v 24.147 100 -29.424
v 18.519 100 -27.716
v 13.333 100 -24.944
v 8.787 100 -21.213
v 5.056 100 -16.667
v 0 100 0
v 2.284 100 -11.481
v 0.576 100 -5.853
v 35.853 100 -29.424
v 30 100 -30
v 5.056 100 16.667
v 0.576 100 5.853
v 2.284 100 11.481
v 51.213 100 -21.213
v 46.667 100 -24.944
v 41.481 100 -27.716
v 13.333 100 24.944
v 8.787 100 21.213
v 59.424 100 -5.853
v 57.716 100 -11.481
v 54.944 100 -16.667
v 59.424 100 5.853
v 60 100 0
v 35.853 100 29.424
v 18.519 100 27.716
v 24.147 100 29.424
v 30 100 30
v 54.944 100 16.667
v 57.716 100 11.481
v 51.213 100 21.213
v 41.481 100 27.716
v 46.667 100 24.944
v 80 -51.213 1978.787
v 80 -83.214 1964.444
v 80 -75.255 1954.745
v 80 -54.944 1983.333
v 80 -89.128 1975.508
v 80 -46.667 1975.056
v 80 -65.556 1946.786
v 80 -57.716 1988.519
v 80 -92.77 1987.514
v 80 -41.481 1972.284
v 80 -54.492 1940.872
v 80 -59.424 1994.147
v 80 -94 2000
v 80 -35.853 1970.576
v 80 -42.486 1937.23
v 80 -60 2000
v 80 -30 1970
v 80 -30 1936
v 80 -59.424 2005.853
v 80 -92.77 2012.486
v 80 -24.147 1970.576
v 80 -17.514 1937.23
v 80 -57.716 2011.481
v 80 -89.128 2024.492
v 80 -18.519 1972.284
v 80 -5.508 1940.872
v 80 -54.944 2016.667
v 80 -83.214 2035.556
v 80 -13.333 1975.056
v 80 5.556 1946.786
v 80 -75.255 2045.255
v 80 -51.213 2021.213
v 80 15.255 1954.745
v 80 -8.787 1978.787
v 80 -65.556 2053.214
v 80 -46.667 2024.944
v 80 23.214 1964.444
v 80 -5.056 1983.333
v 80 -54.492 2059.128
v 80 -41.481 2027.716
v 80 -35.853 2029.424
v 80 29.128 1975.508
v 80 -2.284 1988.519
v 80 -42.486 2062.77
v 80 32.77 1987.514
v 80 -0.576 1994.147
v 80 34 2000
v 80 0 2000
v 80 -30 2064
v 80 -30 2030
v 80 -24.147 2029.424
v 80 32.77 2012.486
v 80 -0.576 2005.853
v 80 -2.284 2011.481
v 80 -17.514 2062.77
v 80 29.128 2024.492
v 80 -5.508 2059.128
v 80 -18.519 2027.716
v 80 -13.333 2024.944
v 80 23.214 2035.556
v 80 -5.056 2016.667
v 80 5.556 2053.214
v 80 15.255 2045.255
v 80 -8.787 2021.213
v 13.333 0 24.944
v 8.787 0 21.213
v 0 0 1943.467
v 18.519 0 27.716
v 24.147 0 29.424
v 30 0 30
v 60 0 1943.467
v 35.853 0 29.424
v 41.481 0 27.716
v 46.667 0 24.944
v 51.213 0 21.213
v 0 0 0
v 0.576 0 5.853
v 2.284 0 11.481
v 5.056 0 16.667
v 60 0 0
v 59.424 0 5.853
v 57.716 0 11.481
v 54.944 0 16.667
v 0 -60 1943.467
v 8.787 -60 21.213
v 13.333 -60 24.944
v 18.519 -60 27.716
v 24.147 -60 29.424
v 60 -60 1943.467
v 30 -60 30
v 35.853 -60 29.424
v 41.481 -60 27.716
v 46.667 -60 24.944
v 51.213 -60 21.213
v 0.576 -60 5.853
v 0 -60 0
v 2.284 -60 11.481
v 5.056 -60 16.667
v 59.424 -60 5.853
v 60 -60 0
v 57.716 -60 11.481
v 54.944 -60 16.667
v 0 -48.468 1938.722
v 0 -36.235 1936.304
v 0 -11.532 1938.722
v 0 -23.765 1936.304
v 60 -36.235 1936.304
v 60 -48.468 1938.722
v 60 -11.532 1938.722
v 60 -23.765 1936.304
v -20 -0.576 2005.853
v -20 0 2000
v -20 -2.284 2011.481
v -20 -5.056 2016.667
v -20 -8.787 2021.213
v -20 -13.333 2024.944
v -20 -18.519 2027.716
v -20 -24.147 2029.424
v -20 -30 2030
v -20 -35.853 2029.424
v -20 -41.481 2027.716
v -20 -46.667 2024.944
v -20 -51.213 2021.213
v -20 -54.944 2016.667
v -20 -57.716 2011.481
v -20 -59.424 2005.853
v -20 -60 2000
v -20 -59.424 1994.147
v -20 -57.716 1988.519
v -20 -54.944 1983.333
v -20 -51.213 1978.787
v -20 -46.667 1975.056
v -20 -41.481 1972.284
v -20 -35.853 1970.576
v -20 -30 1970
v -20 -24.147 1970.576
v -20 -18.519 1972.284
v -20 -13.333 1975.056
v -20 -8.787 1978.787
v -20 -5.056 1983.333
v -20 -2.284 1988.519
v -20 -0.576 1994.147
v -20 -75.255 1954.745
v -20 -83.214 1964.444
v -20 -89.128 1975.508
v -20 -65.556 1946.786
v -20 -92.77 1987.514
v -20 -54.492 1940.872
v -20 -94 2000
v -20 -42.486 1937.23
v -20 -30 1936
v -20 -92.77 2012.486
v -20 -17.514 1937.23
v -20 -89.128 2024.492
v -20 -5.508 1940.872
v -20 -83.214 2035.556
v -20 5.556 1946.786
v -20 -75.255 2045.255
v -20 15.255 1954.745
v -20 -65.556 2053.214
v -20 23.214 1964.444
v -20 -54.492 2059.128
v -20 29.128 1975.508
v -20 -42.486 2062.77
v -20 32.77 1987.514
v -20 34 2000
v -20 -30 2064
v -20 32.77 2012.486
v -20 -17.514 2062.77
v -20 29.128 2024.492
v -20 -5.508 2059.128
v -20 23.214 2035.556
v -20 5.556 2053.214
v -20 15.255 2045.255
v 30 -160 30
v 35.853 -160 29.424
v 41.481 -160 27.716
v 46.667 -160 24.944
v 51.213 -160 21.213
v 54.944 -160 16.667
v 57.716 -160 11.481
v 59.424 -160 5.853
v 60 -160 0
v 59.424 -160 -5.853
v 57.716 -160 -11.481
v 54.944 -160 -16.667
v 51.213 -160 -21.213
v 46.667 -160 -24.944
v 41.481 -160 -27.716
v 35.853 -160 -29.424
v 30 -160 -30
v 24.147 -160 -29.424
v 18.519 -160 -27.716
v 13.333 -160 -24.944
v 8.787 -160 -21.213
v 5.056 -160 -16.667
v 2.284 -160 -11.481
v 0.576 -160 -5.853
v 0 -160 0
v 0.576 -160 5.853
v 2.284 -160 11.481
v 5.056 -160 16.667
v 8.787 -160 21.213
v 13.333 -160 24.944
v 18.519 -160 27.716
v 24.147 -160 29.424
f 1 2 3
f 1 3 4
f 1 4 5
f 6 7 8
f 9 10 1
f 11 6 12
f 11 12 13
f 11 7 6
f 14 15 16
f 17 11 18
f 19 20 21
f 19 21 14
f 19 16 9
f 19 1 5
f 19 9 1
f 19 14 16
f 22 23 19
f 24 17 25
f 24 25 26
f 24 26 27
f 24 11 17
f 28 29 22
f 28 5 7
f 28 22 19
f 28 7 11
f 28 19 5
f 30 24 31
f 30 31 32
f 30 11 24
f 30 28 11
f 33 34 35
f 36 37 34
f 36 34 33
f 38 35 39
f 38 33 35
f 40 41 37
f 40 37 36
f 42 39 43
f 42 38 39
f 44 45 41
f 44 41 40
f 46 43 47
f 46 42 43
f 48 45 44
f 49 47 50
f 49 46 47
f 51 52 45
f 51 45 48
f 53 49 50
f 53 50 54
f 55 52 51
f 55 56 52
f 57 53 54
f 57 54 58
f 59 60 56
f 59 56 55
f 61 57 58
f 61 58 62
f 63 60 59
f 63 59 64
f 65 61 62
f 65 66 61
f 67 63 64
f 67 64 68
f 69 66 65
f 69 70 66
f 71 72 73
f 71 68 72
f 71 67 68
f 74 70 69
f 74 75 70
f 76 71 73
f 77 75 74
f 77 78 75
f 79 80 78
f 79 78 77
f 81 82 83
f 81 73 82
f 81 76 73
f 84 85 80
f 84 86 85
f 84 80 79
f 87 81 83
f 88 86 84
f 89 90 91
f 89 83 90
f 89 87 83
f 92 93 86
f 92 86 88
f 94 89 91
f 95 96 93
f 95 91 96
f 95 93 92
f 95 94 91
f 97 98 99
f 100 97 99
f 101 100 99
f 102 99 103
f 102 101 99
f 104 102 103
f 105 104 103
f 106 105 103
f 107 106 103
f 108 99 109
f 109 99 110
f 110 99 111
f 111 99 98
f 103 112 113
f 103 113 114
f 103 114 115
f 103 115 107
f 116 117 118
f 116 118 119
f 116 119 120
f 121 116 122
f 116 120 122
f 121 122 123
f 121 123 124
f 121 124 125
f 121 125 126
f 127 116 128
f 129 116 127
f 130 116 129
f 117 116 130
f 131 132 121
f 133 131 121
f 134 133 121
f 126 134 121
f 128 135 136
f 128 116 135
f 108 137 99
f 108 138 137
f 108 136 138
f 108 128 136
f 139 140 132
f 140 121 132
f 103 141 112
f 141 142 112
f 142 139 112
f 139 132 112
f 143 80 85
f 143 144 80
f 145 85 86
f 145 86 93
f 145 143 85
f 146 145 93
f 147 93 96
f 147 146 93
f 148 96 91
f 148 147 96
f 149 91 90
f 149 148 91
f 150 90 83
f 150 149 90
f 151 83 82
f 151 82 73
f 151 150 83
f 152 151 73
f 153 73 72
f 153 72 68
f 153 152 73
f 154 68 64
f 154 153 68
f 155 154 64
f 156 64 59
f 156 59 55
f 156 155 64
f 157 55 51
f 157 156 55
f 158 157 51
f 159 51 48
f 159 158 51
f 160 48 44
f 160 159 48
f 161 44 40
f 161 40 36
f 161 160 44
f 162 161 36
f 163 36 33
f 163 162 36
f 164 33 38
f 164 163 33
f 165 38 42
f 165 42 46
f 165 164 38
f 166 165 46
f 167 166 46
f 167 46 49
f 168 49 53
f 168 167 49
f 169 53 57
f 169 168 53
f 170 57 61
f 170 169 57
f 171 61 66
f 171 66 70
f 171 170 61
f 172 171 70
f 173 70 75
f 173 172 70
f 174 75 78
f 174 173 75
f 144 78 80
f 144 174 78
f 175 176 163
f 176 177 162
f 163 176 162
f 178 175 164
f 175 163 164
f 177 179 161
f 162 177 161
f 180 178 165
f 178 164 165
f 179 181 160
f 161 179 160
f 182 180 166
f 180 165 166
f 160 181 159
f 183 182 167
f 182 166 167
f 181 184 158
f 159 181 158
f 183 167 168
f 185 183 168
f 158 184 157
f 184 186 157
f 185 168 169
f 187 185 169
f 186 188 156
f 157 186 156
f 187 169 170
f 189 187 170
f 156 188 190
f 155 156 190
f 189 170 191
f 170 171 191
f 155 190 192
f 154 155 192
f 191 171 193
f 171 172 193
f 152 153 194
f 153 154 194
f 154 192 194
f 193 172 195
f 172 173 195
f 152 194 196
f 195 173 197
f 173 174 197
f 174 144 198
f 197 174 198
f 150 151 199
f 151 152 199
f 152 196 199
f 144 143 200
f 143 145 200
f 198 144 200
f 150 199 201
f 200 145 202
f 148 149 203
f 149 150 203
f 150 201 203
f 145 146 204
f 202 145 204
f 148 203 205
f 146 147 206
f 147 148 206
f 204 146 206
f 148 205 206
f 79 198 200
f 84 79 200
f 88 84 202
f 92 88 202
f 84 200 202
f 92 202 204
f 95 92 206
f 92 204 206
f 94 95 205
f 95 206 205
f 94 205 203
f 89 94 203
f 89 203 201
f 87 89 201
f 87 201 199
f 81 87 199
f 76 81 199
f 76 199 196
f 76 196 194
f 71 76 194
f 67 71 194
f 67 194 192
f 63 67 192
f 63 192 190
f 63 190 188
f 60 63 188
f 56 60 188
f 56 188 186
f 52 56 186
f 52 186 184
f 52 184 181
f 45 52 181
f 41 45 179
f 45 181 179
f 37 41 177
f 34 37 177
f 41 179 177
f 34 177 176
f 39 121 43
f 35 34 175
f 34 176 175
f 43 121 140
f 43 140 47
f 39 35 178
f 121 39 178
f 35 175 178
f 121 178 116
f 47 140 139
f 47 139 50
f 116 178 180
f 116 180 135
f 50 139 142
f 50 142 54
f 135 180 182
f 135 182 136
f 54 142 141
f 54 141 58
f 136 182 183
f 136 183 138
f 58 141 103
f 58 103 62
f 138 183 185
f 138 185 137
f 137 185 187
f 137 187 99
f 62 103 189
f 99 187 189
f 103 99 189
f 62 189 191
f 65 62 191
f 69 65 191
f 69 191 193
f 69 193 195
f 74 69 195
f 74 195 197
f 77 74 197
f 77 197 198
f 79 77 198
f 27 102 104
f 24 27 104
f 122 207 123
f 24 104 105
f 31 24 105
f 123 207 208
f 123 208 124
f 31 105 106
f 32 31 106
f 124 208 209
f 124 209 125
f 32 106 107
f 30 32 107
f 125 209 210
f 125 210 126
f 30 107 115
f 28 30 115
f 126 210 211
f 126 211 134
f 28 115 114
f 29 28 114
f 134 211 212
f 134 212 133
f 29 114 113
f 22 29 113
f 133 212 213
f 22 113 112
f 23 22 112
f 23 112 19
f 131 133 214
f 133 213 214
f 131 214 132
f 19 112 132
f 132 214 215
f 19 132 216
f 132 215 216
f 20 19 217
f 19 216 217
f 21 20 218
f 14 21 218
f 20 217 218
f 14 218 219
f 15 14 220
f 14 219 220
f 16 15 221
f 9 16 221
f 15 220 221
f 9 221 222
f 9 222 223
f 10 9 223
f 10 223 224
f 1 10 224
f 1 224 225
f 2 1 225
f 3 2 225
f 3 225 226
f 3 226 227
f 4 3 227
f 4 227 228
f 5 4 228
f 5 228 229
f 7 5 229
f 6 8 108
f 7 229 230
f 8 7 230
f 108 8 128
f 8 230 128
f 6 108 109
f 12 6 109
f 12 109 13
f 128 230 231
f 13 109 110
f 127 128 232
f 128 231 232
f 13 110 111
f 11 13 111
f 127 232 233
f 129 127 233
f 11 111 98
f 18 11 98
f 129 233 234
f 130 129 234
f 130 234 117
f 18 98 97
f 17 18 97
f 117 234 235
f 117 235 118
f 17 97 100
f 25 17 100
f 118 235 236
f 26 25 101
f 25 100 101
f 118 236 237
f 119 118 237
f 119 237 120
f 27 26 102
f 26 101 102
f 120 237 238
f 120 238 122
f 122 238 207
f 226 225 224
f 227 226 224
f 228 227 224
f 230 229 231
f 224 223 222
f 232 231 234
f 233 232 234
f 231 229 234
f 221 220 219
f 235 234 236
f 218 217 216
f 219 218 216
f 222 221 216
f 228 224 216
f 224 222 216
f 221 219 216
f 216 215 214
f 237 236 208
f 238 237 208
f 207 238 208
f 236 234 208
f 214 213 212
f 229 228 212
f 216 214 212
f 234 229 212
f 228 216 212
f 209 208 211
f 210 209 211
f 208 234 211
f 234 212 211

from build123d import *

# Parameters (mm, degrees)
SKETCH1_W                = 60
SKETCH1_H                = 60
BOSS_EXTRUDE1_DEPTH      = 2000
BOSS_EXTRUDE2_DEPTH      = 100
BOSS_EXTRUDE2_DEPTH_BACK = 160
SKETCH2_R                = 30
BOSS_EXTRUDE3_DEPTH      = 20
BOSS_EXTRUDE3_DEPTH_BACK = 80
SKETCH3_R                = 64
SKETCH3_R_2              = 30
SKETCH4_R                = 30
CUT_EXTRUDE1_DEPTH       = 360


with BuildPart() as part:
    # Sketch1 → Boss-Extrude1 (new body)
    with BuildSketch(Plane.XY):
        with Locations((30, -30)):
            Rectangle(SKETCH1_W, SKETCH1_H)
    extrude(amount=BOSS_EXTRUDE1_DEPTH)

    # Sketch2 → Boss-Extrude2 (add, two sides: drawn at the far end of the back side and taken through both)
    with BuildSketch(Plane(origin=(0, 0, 0), x_dir=(1, 0, 0), z_dir=(0, 1, 0)).offset(-BOSS_EXTRUDE2_DEPTH_BACK)):
        with Locations(Location((30, 0, 0), (0, 0, 270))):
            Circle(SKETCH2_R)
    extrude(amount=BOSS_EXTRUDE2_DEPTH + BOSS_EXTRUDE2_DEPTH_BACK)

    # Sketch3 → Boss-Extrude3 (add, two sides: drawn at the far end of the back side and taken through both)
    with BuildSketch(Plane(origin=(60, 0, 0), x_dir=(0, 0, -1), z_dir=(1, 0, 0)).offset(-BOSS_EXTRUDE3_DEPTH_BACK)):
        with Locations(Location((-2000, -30, 0), (0, 0, 90))):
            Circle(SKETCH3_R)
        with Locations(Location((-2000, -30, 0), (0, 0, 90))):
            Circle(SKETCH3_R_2, mode=Mode.SUBTRACT)
    extrude(amount=BOSS_EXTRUDE3_DEPTH + BOSS_EXTRUDE3_DEPTH_BACK)

    # Sketch4 → Cut-Extrude1 (cut)
    with BuildSketch(Plane(origin=(80, 0, 0), x_dir=(0, 0, -1), z_dir=(1, 0, 0))):
        with Locations(Location((-2000, -30, 0), (0, 0, 90))):
            Circle(SKETCH4_R)
    extrude(amount=-CUT_EXTRUDE1_DEPTH, mode=Mode.SUBTRACT)


solid = part.part
